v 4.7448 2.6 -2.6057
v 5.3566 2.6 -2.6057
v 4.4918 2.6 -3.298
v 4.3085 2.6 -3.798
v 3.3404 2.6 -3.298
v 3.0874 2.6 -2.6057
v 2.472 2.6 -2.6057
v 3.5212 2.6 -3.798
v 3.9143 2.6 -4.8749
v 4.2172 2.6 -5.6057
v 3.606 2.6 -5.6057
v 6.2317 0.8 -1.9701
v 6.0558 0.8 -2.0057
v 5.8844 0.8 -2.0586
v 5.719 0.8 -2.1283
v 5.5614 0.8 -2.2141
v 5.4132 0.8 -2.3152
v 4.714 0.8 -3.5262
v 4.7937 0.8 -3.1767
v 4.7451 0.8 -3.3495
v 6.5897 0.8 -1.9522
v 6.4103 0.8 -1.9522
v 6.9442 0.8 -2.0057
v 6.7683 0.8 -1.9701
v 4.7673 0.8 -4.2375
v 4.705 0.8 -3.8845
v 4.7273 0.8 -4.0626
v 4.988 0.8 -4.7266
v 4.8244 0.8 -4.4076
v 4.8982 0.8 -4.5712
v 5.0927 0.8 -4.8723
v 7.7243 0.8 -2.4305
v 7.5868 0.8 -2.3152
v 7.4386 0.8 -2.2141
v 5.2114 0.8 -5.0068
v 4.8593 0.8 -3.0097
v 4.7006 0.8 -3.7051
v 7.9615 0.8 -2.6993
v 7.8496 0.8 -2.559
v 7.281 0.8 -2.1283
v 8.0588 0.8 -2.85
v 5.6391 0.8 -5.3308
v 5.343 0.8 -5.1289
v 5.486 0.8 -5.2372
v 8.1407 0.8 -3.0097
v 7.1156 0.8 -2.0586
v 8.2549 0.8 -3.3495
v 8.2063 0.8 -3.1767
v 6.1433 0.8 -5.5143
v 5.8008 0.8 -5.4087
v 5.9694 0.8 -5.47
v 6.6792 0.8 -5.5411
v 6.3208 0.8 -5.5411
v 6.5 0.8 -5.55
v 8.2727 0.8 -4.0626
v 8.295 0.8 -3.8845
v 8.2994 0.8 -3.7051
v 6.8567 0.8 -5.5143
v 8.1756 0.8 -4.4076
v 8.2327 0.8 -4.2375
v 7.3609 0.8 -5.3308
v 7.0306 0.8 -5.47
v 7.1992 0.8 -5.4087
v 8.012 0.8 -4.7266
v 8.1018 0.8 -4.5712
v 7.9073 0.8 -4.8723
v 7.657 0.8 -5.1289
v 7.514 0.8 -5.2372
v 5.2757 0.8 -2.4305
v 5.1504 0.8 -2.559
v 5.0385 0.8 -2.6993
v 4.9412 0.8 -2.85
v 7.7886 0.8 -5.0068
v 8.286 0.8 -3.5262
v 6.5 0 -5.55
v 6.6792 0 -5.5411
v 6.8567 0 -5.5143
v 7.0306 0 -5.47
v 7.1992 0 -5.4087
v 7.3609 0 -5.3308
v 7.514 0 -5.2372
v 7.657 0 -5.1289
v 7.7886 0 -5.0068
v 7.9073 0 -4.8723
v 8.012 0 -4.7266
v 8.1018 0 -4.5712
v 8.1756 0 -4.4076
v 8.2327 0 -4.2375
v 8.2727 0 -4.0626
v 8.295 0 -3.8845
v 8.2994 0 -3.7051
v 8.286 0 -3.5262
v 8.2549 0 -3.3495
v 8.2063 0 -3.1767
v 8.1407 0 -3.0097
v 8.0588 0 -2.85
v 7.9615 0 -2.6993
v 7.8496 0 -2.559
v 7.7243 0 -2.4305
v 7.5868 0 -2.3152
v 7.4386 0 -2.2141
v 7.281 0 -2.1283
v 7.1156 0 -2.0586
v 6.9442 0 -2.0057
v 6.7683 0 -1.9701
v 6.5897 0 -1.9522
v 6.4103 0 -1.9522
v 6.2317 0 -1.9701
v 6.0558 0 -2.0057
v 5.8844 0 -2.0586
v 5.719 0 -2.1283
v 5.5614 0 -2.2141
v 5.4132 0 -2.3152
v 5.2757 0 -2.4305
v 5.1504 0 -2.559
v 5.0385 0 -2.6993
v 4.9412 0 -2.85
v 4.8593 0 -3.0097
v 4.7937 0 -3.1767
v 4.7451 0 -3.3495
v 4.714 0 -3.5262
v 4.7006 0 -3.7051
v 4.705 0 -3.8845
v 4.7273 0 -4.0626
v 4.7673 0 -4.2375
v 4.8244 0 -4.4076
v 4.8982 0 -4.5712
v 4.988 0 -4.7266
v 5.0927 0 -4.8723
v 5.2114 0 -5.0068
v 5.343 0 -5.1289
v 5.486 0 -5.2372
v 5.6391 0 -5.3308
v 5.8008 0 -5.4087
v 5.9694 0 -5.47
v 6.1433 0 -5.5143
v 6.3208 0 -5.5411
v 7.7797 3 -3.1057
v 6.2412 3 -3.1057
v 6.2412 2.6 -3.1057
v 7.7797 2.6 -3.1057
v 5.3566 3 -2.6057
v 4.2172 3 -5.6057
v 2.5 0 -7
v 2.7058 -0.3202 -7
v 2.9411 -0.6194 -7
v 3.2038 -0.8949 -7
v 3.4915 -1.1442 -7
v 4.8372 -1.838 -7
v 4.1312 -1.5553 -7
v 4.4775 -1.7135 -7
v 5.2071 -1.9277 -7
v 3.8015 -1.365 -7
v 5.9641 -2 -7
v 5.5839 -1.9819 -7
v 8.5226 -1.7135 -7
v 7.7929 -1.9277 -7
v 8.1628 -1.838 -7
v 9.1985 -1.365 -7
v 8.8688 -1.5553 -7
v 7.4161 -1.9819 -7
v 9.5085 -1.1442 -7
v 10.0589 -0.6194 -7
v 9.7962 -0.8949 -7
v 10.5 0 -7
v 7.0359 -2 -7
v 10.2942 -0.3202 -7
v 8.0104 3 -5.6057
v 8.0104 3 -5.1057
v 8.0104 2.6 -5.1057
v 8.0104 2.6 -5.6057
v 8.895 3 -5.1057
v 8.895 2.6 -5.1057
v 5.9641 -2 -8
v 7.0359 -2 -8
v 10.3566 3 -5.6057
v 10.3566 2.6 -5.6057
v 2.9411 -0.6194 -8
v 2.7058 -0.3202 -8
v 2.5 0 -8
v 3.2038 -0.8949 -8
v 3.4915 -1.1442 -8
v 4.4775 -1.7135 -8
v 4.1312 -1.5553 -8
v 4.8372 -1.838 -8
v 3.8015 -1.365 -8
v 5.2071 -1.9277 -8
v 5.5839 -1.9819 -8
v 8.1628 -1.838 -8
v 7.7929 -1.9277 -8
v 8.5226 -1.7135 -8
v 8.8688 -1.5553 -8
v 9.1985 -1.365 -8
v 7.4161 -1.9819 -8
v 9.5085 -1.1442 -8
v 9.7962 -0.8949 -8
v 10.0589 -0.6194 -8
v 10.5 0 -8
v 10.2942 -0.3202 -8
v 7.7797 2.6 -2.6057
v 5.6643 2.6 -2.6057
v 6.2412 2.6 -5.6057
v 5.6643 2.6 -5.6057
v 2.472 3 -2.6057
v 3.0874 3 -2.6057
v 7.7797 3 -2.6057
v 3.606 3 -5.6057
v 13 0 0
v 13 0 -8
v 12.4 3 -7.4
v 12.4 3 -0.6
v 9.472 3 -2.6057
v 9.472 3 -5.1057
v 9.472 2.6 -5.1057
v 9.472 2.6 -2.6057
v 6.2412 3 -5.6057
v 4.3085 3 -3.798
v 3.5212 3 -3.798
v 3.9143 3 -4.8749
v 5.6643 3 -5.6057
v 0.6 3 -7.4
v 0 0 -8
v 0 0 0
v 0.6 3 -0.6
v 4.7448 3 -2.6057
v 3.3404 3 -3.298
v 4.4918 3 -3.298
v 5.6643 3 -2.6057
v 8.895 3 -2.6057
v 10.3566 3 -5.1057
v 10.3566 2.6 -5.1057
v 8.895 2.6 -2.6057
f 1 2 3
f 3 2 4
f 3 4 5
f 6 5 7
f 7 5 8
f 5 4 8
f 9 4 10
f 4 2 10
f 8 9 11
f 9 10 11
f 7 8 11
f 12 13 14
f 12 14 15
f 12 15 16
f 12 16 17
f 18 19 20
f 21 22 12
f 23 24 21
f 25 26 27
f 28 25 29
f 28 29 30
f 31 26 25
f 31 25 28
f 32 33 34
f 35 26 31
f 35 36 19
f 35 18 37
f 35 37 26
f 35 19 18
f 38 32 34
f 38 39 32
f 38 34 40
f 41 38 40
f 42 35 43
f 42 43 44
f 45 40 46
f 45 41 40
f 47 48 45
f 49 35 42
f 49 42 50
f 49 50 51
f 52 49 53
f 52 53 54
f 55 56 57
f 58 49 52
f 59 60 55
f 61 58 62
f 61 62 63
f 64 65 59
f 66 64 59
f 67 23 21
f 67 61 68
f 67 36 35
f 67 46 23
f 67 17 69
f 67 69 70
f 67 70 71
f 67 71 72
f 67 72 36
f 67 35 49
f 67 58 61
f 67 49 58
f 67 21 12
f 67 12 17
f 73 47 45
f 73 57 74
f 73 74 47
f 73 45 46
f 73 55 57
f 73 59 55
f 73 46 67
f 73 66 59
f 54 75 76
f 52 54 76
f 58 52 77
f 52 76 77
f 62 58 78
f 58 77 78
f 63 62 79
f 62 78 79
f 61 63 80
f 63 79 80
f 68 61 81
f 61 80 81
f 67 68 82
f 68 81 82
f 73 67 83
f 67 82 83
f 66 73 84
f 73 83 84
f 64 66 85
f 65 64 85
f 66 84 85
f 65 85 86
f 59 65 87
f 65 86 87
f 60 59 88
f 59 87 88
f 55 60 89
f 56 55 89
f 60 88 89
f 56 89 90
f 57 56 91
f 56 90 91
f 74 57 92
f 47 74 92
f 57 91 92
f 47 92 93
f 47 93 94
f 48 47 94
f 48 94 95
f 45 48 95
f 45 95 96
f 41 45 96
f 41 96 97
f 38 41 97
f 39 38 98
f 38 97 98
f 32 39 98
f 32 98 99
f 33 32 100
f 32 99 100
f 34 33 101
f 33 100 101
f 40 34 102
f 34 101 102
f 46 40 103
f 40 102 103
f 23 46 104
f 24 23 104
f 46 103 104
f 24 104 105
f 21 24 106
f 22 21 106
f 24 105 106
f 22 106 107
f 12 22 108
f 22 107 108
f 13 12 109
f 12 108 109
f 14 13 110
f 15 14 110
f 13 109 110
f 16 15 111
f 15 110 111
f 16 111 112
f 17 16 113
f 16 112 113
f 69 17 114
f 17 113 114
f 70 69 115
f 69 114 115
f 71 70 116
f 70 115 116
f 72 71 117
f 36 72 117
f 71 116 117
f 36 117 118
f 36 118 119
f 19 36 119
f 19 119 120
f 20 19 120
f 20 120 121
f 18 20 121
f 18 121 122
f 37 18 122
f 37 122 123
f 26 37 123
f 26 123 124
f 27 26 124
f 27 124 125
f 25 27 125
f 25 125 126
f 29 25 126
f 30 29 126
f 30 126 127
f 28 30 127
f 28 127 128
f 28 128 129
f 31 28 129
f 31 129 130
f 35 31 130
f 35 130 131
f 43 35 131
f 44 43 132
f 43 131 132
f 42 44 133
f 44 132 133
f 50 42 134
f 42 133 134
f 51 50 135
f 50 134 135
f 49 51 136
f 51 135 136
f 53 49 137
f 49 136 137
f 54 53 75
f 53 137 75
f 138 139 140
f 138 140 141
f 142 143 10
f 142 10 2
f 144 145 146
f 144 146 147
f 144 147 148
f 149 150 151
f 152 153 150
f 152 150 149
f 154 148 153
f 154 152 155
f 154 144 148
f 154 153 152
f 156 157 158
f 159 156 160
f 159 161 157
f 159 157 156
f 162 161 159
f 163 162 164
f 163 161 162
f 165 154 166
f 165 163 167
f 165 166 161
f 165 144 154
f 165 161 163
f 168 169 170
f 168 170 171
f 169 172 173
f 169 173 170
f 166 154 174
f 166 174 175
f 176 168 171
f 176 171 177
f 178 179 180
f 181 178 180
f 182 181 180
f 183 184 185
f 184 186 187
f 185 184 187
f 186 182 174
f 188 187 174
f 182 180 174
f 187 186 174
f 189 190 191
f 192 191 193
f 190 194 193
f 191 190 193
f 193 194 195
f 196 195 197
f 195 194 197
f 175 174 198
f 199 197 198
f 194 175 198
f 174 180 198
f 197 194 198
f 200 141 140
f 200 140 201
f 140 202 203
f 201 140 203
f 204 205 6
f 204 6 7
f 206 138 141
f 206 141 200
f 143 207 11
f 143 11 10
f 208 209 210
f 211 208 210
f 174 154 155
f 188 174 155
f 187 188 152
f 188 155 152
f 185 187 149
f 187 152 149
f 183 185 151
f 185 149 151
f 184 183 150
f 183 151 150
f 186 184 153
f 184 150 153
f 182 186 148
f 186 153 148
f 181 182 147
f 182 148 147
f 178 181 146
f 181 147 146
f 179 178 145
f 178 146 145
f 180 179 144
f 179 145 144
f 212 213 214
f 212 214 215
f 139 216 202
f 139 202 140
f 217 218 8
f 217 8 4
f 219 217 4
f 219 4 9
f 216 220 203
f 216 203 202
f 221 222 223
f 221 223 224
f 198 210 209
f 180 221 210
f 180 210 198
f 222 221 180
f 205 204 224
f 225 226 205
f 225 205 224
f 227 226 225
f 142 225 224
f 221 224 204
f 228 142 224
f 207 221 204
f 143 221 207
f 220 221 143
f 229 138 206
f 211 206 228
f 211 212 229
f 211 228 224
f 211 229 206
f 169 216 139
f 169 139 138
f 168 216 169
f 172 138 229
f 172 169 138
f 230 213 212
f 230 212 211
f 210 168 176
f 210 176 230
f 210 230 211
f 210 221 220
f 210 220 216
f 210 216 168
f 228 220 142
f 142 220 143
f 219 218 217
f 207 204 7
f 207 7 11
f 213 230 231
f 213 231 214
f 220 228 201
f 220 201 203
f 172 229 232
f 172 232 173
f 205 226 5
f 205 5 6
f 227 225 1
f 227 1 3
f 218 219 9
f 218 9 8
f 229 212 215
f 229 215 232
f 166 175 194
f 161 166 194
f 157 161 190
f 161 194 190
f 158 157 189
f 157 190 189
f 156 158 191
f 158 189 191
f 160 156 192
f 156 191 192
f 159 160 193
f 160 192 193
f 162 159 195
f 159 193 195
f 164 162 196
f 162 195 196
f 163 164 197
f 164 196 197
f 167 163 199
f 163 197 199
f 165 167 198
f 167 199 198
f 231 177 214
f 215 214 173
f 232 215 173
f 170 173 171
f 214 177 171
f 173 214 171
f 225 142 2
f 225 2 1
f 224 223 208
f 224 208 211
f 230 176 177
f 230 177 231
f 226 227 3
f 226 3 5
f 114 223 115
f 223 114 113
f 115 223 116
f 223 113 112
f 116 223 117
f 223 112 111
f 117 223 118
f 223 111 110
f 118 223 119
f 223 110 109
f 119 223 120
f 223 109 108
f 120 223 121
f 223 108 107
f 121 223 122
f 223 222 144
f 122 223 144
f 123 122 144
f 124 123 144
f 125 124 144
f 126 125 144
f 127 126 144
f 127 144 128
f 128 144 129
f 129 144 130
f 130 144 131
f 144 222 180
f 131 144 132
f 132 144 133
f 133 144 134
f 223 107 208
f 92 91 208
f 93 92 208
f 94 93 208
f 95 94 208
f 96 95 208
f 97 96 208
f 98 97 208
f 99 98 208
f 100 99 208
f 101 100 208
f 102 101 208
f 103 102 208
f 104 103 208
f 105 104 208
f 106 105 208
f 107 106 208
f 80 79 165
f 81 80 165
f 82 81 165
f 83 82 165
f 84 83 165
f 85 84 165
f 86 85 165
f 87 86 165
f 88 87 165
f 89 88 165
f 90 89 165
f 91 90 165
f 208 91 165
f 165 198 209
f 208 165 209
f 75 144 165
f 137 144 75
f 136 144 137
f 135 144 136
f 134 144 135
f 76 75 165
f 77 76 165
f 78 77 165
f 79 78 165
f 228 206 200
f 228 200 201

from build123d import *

# Parameters (mm, degrees)
SKETCH1_W               = 13
SKETCH1_H               = 8
BOSS_EXTRUDE1_DEPTH     = 3
CUT_EXTRUDE1_DEPTH      = 16.556349186
CUT_EXTRUDE1_DEPTH_BACK = 16.556349186
CUT_EXTRUDE2_DEPTH      = 16.556349186
CUT_EXTRUDE2_DEPTH_BACK = 16.556349186
SKETCH4_R               = 1.8
CUT_EXTRUDE3_DEPTH      = 0.8
SKETCH5_W               = 8
SKETCH5_H               = 1
BOSS_EXTRUDE2_DEPTH     = 2
FILLET1_R               = 4
CUT_EXTRUDE4_DEPTH      = 0.4


with BuildPart() as part:
    # Sketch1 → Boss-Extrude1 (new body)
    with BuildSketch(Plane(origin=(0, 0, 0), x_dir=(1, 0, 0), z_dir=(0, 1, 0))):
        with Locations((6.5, 4)):
            Rectangle(SKETCH1_W, SKETCH1_H)
    extrude(amount=BOSS_EXTRUDE1_DEPTH)

    # Sketch2 → Cut-Extrude1 (cut, two sides: drawn at the far end of the back side and taken through both)
    with BuildSketch(Plane.XY.offset(-CUT_EXTRUDE1_DEPTH_BACK)):
        Polygon((0, 0), (0.6, 3), (0, 3), align=None)
        Polygon((13, 0), (12.4, 3), (13, 3), align=None)
    extrude(amount=CUT_EXTRUDE1_DEPTH + CUT_EXTRUDE1_DEPTH_BACK, mode=Mode.SUBTRACT)

    # Sketch3 → Cut-Extrude2 (cut, two sides: drawn at the far end of the back side and taken through both)
    with BuildSketch(Plane(origin=(0, 0, 0), x_dir=(0, 0, -1), z_dir=(1, 0, 0)).offset(-CUT_EXTRUDE2_DEPTH_BACK)):
        Polygon((0, 0), (0.6, 3), (0, 3), align=None)
        Polygon((8, 3), (7.4, 3), (8, 0), align=None)
    extrude(amount=CUT_EXTRUDE2_DEPTH + CUT_EXTRUDE2_DEPTH_BACK, mode=Mode.SUBTRACT)

    # Sketch4 → Cut-Extrude3 (cut)
    with BuildSketch(Plane.XZ):
        with Locations(Location((6.50000125, -3.75, 0), (0, 0, 270))):
            Circle(SKETCH4_R)
    extrude(amount=-CUT_EXTRUDE3_DEPTH, mode=Mode.SUBTRACT)

    # Sketch5 → Boss-Extrude2 (add)
    with BuildSketch(Plane.XZ):
        with Locations((6.500011, -7.5)):
            Rectangle(SKETCH5_W, SKETCH5_H)
    extrude(amount=BOSS_EXTRUDE2_DEPTH)

    # Fillet1
    # the kernel refuses this fillet: 4 mm, written as the material it takes off along each edge
    with BuildSketch(Plane(origin=(10.500011, -2, -16.660254038), x_dir=(0, 1, 0), z_dir=(0, 0, 1)), Plane(origin=(2.500011, -2, 1.660254038), x_dir=(0, 1, 0), z_dir=(0, 0, -1))) as fillet1_piece_1:
        with BuildLine():
            CenterArc((4, 3.464101615), FILLET1_R, 180, 60)
            Line((0, 3.464101615), (-0.08, 3.464101615))
            Line((-0.08, 3.464101615), (-0.08, 0))
            Line((-0.08, 0), (0, -0.08))
            ThreePointArc((0, -0.08), (1, -0.08), (1.96, -0.069282032))
            Line((1.96, -0.069282032), (2, 0))
        make_face()
    extrude(amount=18.320508076, mode=Mode.SUBTRACT)

    # Sketch6 → Cut-Extrude4 (cut)
    # profile 1 of 3: a face of its own
    with BuildSketch(Plane(origin=(0, 3, 0), x_dir=(1, 0, 0), z_dir=(0, 1, 0))):
        Polygon((5.356583629, 2.605681315), (4.744804782, 2.605681315), (4.491799975, 3.297989008), (3.340357667, 3.297989008), (3.087352859, 2.605681315), (2.471968244, 2.605681315), (3.605982667, 5.605681315), (4.217160552, 5.605681315), align=None)
        Polygon((4.308506705, 3.797989008), (3.914275936, 4.874912084), (3.52124709, 3.797989008), align=None, mode=Mode.SUBTRACT)
    # profile 2 of 3: a face of its own
    with BuildSketch(Plane(origin=(0, 3, 0), x_dir=(1, 0, 0), z_dir=(0, 1, 0))):
        Polygon((5.664275936, 2.605681315), (5.664275936, 5.605681315), (6.241199013, 5.605681315), (6.241199013, 3.105681315), (7.779660552, 3.105681315), (7.779660552, 2.605681315), align=None)
    # profile 3 of 3: a face of its own
    with BuildSketch(Plane(origin=(0, 3, 0), x_dir=(1, 0, 0), z_dir=(0, 1, 0))):
        Polygon((8.895045167, 2.605681315), (8.895045167, 5.105681315), (8.010429782, 5.105681315), (8.010429782, 5.605681315), (10.356583629, 5.605681315), (10.356583629, 5.105681315), (9.471968244, 5.105681315), (9.471968244, 2.605681315), align=None)
    extrude(amount=-CUT_EXTRUDE4_DEPTH, mode=Mode.SUBTRACT)


solid = part.part
